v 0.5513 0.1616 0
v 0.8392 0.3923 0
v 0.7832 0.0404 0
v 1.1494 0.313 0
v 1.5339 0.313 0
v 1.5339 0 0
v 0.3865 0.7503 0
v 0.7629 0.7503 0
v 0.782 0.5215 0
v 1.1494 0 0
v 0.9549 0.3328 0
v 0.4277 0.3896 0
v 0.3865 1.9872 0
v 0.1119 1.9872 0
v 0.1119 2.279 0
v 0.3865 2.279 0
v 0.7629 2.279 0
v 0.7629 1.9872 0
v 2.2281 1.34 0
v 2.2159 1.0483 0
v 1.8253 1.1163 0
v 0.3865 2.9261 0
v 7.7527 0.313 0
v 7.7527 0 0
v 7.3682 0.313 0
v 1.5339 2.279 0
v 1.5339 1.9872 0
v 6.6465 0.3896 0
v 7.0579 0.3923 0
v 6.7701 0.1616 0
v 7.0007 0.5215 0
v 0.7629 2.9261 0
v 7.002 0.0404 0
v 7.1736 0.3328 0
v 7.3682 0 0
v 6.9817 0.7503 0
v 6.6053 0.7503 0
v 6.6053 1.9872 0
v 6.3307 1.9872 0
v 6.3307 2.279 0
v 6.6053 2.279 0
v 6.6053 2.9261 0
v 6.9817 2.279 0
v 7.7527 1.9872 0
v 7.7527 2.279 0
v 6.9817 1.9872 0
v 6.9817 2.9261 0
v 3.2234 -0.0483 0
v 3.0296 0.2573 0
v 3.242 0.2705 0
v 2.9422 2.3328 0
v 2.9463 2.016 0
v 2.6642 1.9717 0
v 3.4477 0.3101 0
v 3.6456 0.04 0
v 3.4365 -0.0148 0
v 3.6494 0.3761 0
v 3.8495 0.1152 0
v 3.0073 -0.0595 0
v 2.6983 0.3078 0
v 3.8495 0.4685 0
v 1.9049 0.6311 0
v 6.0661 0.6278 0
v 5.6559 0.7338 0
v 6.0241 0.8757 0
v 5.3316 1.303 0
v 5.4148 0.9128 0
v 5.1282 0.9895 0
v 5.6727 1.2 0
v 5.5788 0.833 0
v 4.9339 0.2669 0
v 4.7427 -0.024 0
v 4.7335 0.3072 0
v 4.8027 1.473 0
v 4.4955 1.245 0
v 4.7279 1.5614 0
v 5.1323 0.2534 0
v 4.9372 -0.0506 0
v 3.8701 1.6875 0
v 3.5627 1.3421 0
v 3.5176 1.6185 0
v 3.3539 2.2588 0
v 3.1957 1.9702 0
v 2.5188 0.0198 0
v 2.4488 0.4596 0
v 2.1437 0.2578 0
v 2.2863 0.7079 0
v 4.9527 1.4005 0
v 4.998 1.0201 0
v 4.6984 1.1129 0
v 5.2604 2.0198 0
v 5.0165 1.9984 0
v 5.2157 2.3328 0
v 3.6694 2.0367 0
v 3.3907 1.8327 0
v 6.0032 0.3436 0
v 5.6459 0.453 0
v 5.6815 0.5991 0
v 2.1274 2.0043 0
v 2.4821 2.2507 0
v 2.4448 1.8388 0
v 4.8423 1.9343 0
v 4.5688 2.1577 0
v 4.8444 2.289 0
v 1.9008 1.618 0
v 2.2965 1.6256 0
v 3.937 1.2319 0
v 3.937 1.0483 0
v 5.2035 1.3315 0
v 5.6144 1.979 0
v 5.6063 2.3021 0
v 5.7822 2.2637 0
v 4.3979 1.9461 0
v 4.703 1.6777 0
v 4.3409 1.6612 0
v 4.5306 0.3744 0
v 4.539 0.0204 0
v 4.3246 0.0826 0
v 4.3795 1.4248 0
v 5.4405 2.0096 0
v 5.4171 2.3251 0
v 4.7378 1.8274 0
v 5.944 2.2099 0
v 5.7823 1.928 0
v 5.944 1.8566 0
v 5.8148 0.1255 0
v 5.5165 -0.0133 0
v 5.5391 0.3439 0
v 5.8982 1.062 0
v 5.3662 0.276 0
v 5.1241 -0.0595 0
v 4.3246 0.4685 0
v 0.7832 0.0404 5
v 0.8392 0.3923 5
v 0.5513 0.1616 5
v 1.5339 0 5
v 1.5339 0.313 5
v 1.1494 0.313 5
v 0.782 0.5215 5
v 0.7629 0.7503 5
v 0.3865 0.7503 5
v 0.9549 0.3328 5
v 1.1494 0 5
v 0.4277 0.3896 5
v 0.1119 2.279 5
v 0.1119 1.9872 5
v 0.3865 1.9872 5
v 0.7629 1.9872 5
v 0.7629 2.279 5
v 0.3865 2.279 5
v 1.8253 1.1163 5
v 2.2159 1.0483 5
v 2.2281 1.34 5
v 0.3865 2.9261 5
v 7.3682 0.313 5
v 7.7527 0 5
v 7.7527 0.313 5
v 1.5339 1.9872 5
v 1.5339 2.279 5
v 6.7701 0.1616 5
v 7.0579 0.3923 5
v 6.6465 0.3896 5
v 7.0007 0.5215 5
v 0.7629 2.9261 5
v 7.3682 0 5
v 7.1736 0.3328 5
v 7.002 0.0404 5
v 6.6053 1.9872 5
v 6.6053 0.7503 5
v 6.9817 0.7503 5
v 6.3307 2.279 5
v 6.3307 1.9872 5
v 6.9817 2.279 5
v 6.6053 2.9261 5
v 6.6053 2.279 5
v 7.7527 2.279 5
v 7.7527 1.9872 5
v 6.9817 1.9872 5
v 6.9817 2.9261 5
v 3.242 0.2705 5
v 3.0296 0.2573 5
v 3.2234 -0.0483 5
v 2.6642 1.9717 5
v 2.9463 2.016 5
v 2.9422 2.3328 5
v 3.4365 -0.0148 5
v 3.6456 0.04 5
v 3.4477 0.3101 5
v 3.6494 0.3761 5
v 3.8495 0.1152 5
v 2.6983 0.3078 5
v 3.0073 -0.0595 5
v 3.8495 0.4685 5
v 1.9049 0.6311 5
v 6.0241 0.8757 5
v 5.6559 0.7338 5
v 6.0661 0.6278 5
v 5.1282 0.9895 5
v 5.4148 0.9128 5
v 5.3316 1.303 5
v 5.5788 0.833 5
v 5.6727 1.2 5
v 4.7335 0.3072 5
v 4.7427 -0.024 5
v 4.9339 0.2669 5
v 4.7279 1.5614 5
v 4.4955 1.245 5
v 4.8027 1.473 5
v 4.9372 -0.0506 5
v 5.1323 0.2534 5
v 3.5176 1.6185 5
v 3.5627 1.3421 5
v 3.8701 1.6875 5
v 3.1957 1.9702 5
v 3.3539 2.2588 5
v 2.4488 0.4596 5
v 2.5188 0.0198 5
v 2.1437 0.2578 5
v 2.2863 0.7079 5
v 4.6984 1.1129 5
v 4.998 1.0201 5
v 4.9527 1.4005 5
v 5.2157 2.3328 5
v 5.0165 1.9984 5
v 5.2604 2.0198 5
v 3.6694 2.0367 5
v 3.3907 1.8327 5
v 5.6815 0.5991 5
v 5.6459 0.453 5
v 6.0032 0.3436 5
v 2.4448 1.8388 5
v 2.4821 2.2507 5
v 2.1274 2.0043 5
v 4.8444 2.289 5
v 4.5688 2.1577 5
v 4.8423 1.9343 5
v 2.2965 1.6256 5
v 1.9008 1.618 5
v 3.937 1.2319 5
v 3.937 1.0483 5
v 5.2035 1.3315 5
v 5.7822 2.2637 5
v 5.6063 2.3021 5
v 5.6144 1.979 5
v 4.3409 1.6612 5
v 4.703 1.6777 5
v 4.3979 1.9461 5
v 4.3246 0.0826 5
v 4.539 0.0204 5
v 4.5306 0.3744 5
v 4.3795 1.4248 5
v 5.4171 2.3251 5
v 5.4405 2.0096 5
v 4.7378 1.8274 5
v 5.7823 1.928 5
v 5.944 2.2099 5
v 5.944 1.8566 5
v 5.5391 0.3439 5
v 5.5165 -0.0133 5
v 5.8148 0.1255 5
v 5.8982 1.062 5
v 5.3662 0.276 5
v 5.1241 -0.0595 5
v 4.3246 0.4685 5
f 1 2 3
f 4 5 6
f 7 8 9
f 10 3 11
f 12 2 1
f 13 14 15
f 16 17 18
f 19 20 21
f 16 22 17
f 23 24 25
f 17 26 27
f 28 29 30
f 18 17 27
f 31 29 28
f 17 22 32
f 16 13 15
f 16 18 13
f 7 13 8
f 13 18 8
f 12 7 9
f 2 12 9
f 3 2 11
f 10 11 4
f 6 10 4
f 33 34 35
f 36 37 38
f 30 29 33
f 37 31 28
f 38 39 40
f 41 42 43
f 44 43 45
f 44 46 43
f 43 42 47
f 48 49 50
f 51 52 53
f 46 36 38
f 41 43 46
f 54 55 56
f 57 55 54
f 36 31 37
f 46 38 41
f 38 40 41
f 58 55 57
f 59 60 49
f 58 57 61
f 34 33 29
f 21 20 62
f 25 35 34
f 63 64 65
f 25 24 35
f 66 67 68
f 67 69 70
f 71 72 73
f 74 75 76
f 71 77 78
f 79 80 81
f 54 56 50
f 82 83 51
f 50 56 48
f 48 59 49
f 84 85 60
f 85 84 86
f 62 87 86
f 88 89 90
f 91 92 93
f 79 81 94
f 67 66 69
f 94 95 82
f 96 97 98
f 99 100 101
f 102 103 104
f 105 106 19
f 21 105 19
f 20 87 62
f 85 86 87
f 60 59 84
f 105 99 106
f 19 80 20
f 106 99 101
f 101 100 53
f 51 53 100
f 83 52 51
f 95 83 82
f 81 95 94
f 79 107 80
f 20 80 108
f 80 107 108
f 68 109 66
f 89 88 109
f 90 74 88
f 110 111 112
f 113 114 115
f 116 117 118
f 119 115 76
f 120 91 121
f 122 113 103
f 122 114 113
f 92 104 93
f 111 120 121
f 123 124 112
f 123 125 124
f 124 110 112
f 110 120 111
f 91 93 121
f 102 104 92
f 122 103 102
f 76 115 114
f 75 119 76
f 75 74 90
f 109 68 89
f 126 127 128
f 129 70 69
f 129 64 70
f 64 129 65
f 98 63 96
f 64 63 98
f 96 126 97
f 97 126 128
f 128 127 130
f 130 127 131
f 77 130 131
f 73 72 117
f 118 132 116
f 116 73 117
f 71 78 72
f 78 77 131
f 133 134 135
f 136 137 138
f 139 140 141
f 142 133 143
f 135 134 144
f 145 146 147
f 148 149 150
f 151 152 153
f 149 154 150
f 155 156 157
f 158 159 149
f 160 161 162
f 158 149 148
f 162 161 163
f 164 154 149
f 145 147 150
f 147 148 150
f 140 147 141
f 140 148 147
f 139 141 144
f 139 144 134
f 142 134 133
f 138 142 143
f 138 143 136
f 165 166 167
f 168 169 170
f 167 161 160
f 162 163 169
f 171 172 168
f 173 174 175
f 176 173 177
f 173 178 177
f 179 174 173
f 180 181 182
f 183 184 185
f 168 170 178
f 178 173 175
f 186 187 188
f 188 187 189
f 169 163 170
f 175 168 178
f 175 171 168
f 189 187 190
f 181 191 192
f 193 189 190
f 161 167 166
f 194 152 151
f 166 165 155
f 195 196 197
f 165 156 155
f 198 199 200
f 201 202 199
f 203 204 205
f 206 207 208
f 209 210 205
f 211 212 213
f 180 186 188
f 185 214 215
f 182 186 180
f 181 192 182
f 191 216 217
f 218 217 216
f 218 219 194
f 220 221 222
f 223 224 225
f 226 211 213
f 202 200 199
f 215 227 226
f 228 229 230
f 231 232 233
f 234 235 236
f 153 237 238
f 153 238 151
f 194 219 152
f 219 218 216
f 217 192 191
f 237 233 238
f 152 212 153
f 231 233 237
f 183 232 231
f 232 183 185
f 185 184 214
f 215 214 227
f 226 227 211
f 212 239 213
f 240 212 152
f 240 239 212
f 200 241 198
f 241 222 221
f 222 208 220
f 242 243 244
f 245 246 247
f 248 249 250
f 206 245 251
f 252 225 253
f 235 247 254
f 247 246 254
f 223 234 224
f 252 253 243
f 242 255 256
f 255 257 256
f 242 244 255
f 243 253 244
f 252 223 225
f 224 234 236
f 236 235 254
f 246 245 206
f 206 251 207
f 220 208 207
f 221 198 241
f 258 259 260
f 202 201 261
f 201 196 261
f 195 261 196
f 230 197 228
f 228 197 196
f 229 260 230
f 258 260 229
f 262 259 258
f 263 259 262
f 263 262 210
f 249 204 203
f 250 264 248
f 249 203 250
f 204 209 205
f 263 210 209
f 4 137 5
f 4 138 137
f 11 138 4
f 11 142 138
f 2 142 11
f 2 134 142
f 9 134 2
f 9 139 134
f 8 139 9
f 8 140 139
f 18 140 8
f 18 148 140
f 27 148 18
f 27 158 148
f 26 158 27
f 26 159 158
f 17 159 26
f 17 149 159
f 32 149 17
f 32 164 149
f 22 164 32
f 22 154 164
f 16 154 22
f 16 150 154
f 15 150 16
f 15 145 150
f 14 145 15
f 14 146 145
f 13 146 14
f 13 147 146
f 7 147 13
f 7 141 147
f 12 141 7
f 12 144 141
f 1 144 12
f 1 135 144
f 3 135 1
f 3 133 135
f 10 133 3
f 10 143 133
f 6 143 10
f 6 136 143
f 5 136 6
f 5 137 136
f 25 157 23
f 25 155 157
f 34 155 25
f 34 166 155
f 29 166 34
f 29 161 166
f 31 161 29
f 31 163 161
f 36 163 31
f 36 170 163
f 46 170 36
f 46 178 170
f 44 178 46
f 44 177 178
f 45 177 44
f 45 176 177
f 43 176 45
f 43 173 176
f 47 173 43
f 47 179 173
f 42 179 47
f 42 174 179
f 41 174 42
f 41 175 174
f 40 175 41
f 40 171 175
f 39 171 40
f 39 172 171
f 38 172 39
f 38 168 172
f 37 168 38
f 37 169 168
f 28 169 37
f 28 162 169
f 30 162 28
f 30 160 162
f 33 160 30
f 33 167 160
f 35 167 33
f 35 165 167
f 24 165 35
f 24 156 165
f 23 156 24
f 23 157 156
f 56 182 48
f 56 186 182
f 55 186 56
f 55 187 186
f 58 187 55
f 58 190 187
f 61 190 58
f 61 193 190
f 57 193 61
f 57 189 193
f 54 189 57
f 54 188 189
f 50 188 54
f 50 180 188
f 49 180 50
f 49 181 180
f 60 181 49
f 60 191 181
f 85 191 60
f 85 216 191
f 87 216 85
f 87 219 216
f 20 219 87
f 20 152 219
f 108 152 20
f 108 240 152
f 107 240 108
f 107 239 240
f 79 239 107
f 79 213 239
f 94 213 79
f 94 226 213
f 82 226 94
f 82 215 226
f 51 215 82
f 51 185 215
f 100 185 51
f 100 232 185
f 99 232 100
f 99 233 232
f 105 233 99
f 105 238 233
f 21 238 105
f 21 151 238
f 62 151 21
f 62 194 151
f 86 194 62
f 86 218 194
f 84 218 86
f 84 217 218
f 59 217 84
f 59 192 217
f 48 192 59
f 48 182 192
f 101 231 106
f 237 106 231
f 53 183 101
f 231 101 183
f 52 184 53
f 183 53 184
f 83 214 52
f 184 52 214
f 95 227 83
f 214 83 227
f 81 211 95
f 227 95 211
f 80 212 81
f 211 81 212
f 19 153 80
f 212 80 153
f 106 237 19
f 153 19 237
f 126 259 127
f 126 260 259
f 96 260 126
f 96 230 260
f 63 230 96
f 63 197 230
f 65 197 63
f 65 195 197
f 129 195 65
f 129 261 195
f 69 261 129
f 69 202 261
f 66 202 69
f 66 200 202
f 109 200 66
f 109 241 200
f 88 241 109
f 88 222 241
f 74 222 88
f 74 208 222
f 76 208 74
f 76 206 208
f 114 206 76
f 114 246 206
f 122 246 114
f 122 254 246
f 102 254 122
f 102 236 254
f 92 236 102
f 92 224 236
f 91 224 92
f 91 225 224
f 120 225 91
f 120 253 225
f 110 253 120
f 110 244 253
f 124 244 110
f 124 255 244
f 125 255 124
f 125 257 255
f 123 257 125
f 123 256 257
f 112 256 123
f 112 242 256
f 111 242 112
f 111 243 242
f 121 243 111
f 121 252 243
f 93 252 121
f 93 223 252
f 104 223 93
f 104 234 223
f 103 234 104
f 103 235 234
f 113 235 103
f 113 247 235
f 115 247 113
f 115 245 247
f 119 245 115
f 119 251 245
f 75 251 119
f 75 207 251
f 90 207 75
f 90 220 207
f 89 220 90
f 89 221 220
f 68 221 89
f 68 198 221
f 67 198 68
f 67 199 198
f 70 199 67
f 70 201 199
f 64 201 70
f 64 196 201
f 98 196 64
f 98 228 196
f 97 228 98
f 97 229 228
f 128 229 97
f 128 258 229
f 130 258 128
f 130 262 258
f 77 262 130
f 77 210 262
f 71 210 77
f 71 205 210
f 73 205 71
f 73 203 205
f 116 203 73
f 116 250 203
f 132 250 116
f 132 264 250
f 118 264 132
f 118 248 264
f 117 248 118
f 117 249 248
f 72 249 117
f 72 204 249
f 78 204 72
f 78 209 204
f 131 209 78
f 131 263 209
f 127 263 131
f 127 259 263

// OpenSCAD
texte_a_inserer ="test"; 
taille = 3;
police = "DejaVu Sans";//[[Abril Fatface,Aclonica,Acme,Advent Pro,Akronim,Aladin,Alegreya,Alegreya Sans,Alegreya SC,Alex Brush,Alfa Slab One,Alice,Amaranth,Architects Daughter,Archivo Black,Archivo Narrow,Arimo,Arvo,Asap,Astloch,Asul,Averia Libre,Averia Serif Libre,Bangers,Basic,Belgrano,Berkshire Swash,Bigshot One,Bilbo Swash Caps,Black Ops One,Bonbon,Bowlby One SC,Brawler,Bubblegum Sans,Butterfly Kids,Cabin Condensed,Caesar Dressing,Cagliostro,Calligraffitti,Capriola,Carter One,Changa One,Chango,Chelsea Market,Cherry Cream Soda,Chewy,Chicle,Chivo,Clicker Script,Coming Soon,Concert One,Condiment,Cookie,Courgette,Covered By Your Grace,Crimson Text,Dancing Script,DejaVu Sans,DejaVu Serif,Dhurjati,Doppio One,Dosis,Droid Sans,Eagle Lake,Electrolize,Emilys Candy,Encode Sans,Encode Sans Compressed,Euphoria Script,Exo,Exo 2,Faster One,Federo,Finger Paint,Fjord One,Fontdiner Swanky,Freckle Face,Fruktur,Gabriela,Geo,Germania One,Give You Glory,Gloria Hallelujah,Goudy Bookletter 1911,Graduate,Grand Hotel,Great Vibes,Griffy,Hanalei Fill,Happy Monkey,Henny Penny,Hind,IM Fell English SC,Indie Flower,Irish Grover,Italianno,Jacques Francois Shadow,Jolly Lodger,Josefin Slab,Joti One,Judson,Just Another Hand,Kalam,Kameron,Karma,Kavoon,Knewave,Kranky,Kristi,Laila,Lakki Reddy,Lancelot,Lato,Leckerli One,Ledger,Lekton,Lemon One,Liberation Sans,Libre Caslon Text,Life Savers,Lilita One,Lily Script One,Limelight,Lobster,Lobster Two,Londrina Outline,Londrina Shadow,Londrina Solid,Lora,Love Ya Like A Sister,Loved by the King,Lovers Quarrel,Luckiest Guy,Lusitana,Macondo,Macondo Swash Caps,Mako,Marck Script,Margarine,Marko One,Maven Pro,McLaren,MedievalSharp,Merienda One,Merriweather,Mervale Script,Metal Mania,Metrophobic,Milonga,Miltonian Tattoo,Miss Fajardose,Molle,Montez,Montserrat,Mr De Haviland,Mystery Quest,Neucha,New Rocker,Niconne,Nosifer,Nothing You Could Do,Noto Sans Oriya,Noto Serif,Nova Square,Nunito,Old Standard TT,Oleo Script,Oleo Script Swash Caps,Orbitron,Oregano,Orienta,Original Surfer,Oswald,Over the Rainbow,Overlock,Oxygen,Pacifico,Paprika,Parisienne,Patrick Hand SC,Paytone One,Peralta,Permanent Marker,Piedra,Pirata One,Play,Playball,Poetsen One,Poppins,Press Start 2P,Princess Sofia,PT Mono,Qwigley,Racing Sans One,Raleway,Rancho,Ranga,Ribeye,Roboto,Roboto Condensed,Roboto Slab,Rochester,Rock Salt,Rubik One,Sail,Salsa,Sansita One,Sarina,Satisfy,Schoolbell,Seaweed Script,Sevillana,Shadows Into Light,Shadows Into Light Two,Share,Six Caps,Skranji,Source Sans Pro,Spicy Rice,Stardos Stencil,Stoke,Syncopate,Teko,Terminal Dosis,The Girl Next Door,Tillana,Timmana,Titillium Web,Ubuntu,Ultra,Underdog,UnifrakturCook,UnifrakturMaguntia,Vampiro One,Vidaloka,Viga,Voces,Volkhov,Vollkorn,Voltaire,Waiting for the Sunrise,Wallpoet,Wellfleet,Wendy One,Yellowtail,Yesteryear,Zeyada]]
hauteur = 5;
module rendu(){
linear_extrude(hauteur) text(texte_a_inserer,size = taille, font = police);
}
rendu();
 
